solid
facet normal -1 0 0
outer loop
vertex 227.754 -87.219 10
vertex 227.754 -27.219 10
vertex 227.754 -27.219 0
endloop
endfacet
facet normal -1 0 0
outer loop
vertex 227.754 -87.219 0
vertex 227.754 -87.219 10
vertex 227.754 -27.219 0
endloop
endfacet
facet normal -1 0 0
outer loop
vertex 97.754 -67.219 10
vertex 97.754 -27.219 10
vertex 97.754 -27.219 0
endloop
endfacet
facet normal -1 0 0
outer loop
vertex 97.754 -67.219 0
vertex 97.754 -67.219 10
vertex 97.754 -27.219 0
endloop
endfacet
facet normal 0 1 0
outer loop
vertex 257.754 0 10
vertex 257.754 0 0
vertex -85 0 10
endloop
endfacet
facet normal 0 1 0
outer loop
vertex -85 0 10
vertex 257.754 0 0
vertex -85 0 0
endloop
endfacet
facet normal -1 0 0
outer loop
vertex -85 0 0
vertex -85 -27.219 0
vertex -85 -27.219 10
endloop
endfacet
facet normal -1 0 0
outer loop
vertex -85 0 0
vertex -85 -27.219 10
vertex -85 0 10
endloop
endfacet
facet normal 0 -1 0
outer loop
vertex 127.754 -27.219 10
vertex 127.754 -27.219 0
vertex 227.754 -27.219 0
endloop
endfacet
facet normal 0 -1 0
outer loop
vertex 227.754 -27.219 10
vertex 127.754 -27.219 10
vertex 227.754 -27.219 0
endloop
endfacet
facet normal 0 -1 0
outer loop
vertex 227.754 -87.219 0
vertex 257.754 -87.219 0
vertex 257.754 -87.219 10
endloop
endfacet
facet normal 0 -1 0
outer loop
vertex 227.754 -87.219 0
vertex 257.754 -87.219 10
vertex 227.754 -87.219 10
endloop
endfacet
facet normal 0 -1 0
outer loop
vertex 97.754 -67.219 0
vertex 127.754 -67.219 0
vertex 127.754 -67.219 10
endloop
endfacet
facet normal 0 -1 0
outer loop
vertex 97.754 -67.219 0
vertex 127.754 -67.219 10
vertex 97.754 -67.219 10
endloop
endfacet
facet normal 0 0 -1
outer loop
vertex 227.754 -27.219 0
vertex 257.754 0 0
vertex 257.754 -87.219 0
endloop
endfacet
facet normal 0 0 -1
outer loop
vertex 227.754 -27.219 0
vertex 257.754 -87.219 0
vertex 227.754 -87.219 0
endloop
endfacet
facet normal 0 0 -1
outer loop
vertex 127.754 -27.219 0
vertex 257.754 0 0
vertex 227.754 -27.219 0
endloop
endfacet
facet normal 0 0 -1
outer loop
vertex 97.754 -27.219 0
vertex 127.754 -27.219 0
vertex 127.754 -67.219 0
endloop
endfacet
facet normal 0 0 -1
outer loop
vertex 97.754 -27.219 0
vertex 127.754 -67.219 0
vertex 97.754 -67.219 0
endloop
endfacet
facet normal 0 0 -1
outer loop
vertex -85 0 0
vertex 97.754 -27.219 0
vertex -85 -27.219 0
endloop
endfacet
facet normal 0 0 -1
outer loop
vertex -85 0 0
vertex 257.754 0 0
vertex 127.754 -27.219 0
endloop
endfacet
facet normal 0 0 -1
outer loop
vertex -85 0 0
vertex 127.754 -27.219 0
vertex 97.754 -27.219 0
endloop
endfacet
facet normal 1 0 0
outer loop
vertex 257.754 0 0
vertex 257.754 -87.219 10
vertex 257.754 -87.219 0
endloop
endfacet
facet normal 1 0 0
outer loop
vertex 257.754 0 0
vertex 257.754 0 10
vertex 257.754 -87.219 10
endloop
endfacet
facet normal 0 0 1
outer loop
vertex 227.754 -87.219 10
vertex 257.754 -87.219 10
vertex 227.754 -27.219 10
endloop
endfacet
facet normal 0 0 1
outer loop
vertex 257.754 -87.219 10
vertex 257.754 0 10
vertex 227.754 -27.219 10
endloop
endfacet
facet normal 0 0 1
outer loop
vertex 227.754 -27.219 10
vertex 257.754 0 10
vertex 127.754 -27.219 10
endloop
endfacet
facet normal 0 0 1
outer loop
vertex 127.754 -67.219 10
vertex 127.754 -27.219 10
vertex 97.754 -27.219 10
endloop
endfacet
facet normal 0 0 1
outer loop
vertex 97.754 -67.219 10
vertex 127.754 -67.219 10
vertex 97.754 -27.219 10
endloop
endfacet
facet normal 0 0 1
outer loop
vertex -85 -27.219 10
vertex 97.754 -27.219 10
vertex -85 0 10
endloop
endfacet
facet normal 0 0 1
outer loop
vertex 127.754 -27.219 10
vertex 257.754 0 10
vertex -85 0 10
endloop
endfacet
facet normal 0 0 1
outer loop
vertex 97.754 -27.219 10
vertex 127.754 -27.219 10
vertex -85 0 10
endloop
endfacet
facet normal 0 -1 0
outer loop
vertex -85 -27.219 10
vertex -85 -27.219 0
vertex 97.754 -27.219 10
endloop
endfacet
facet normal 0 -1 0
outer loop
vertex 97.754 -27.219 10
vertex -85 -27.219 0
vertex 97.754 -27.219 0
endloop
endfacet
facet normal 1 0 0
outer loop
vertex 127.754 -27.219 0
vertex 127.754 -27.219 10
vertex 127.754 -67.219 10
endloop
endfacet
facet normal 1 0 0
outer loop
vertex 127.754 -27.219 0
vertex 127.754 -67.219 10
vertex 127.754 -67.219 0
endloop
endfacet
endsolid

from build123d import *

# Parameters (mm, degrees)
BOSS_EXTRUDE1_DEPTH = 10
SKETCH2_W           = 30
SKETCH2_H           = 10
BOSS_EXTRUDE2_DEPTH = 60
SKETCH3_W           = 30
SKETCH3_H           = 10
BOSS_EXTRUDE3_DEPTH = 40


with BuildPart() as part:
    # Sketch1 → Boss-Extrude1 (new body)
    with BuildSketch(Plane.XY):
        Polygon((0, 0), (257.754406597, 0), (257.754406597, -27.219263415), (18.493720775, -27.219263415), (-56.767393161, -27.219263415), (-80, -27.219263415), (-85, -27.219263415), (-85, 0), (-80, 0), (-70, 0), align=None)
    extrude(amount=BOSS_EXTRUDE1_DEPTH)

    # Sketch2 → Boss-Extrude2 (add)
    with BuildSketch(Plane(origin=(0, -27.219263415, 0), x_dir=(-1, 0, 0), z_dir=(0, -1, 0))):
        with Locations((-242.754406597, -5)):
            Rectangle(SKETCH2_W, SKETCH2_H)
    extrude(amount=BOSS_EXTRUDE2_DEPTH)

    # Sketch3 → Boss-Extrude3 (add)
    with BuildSketch(Plane(origin=(0, -27.219263415, 0), x_dir=(-1, 0, 0), z_dir=(0, -1, 0))):
        with Locations((-112.754406597, -5)):
            Rectangle(SKETCH3_W, SKETCH3_H)
    extrude(amount=BOSS_EXTRUDE3_DEPTH)


solid = part.part
